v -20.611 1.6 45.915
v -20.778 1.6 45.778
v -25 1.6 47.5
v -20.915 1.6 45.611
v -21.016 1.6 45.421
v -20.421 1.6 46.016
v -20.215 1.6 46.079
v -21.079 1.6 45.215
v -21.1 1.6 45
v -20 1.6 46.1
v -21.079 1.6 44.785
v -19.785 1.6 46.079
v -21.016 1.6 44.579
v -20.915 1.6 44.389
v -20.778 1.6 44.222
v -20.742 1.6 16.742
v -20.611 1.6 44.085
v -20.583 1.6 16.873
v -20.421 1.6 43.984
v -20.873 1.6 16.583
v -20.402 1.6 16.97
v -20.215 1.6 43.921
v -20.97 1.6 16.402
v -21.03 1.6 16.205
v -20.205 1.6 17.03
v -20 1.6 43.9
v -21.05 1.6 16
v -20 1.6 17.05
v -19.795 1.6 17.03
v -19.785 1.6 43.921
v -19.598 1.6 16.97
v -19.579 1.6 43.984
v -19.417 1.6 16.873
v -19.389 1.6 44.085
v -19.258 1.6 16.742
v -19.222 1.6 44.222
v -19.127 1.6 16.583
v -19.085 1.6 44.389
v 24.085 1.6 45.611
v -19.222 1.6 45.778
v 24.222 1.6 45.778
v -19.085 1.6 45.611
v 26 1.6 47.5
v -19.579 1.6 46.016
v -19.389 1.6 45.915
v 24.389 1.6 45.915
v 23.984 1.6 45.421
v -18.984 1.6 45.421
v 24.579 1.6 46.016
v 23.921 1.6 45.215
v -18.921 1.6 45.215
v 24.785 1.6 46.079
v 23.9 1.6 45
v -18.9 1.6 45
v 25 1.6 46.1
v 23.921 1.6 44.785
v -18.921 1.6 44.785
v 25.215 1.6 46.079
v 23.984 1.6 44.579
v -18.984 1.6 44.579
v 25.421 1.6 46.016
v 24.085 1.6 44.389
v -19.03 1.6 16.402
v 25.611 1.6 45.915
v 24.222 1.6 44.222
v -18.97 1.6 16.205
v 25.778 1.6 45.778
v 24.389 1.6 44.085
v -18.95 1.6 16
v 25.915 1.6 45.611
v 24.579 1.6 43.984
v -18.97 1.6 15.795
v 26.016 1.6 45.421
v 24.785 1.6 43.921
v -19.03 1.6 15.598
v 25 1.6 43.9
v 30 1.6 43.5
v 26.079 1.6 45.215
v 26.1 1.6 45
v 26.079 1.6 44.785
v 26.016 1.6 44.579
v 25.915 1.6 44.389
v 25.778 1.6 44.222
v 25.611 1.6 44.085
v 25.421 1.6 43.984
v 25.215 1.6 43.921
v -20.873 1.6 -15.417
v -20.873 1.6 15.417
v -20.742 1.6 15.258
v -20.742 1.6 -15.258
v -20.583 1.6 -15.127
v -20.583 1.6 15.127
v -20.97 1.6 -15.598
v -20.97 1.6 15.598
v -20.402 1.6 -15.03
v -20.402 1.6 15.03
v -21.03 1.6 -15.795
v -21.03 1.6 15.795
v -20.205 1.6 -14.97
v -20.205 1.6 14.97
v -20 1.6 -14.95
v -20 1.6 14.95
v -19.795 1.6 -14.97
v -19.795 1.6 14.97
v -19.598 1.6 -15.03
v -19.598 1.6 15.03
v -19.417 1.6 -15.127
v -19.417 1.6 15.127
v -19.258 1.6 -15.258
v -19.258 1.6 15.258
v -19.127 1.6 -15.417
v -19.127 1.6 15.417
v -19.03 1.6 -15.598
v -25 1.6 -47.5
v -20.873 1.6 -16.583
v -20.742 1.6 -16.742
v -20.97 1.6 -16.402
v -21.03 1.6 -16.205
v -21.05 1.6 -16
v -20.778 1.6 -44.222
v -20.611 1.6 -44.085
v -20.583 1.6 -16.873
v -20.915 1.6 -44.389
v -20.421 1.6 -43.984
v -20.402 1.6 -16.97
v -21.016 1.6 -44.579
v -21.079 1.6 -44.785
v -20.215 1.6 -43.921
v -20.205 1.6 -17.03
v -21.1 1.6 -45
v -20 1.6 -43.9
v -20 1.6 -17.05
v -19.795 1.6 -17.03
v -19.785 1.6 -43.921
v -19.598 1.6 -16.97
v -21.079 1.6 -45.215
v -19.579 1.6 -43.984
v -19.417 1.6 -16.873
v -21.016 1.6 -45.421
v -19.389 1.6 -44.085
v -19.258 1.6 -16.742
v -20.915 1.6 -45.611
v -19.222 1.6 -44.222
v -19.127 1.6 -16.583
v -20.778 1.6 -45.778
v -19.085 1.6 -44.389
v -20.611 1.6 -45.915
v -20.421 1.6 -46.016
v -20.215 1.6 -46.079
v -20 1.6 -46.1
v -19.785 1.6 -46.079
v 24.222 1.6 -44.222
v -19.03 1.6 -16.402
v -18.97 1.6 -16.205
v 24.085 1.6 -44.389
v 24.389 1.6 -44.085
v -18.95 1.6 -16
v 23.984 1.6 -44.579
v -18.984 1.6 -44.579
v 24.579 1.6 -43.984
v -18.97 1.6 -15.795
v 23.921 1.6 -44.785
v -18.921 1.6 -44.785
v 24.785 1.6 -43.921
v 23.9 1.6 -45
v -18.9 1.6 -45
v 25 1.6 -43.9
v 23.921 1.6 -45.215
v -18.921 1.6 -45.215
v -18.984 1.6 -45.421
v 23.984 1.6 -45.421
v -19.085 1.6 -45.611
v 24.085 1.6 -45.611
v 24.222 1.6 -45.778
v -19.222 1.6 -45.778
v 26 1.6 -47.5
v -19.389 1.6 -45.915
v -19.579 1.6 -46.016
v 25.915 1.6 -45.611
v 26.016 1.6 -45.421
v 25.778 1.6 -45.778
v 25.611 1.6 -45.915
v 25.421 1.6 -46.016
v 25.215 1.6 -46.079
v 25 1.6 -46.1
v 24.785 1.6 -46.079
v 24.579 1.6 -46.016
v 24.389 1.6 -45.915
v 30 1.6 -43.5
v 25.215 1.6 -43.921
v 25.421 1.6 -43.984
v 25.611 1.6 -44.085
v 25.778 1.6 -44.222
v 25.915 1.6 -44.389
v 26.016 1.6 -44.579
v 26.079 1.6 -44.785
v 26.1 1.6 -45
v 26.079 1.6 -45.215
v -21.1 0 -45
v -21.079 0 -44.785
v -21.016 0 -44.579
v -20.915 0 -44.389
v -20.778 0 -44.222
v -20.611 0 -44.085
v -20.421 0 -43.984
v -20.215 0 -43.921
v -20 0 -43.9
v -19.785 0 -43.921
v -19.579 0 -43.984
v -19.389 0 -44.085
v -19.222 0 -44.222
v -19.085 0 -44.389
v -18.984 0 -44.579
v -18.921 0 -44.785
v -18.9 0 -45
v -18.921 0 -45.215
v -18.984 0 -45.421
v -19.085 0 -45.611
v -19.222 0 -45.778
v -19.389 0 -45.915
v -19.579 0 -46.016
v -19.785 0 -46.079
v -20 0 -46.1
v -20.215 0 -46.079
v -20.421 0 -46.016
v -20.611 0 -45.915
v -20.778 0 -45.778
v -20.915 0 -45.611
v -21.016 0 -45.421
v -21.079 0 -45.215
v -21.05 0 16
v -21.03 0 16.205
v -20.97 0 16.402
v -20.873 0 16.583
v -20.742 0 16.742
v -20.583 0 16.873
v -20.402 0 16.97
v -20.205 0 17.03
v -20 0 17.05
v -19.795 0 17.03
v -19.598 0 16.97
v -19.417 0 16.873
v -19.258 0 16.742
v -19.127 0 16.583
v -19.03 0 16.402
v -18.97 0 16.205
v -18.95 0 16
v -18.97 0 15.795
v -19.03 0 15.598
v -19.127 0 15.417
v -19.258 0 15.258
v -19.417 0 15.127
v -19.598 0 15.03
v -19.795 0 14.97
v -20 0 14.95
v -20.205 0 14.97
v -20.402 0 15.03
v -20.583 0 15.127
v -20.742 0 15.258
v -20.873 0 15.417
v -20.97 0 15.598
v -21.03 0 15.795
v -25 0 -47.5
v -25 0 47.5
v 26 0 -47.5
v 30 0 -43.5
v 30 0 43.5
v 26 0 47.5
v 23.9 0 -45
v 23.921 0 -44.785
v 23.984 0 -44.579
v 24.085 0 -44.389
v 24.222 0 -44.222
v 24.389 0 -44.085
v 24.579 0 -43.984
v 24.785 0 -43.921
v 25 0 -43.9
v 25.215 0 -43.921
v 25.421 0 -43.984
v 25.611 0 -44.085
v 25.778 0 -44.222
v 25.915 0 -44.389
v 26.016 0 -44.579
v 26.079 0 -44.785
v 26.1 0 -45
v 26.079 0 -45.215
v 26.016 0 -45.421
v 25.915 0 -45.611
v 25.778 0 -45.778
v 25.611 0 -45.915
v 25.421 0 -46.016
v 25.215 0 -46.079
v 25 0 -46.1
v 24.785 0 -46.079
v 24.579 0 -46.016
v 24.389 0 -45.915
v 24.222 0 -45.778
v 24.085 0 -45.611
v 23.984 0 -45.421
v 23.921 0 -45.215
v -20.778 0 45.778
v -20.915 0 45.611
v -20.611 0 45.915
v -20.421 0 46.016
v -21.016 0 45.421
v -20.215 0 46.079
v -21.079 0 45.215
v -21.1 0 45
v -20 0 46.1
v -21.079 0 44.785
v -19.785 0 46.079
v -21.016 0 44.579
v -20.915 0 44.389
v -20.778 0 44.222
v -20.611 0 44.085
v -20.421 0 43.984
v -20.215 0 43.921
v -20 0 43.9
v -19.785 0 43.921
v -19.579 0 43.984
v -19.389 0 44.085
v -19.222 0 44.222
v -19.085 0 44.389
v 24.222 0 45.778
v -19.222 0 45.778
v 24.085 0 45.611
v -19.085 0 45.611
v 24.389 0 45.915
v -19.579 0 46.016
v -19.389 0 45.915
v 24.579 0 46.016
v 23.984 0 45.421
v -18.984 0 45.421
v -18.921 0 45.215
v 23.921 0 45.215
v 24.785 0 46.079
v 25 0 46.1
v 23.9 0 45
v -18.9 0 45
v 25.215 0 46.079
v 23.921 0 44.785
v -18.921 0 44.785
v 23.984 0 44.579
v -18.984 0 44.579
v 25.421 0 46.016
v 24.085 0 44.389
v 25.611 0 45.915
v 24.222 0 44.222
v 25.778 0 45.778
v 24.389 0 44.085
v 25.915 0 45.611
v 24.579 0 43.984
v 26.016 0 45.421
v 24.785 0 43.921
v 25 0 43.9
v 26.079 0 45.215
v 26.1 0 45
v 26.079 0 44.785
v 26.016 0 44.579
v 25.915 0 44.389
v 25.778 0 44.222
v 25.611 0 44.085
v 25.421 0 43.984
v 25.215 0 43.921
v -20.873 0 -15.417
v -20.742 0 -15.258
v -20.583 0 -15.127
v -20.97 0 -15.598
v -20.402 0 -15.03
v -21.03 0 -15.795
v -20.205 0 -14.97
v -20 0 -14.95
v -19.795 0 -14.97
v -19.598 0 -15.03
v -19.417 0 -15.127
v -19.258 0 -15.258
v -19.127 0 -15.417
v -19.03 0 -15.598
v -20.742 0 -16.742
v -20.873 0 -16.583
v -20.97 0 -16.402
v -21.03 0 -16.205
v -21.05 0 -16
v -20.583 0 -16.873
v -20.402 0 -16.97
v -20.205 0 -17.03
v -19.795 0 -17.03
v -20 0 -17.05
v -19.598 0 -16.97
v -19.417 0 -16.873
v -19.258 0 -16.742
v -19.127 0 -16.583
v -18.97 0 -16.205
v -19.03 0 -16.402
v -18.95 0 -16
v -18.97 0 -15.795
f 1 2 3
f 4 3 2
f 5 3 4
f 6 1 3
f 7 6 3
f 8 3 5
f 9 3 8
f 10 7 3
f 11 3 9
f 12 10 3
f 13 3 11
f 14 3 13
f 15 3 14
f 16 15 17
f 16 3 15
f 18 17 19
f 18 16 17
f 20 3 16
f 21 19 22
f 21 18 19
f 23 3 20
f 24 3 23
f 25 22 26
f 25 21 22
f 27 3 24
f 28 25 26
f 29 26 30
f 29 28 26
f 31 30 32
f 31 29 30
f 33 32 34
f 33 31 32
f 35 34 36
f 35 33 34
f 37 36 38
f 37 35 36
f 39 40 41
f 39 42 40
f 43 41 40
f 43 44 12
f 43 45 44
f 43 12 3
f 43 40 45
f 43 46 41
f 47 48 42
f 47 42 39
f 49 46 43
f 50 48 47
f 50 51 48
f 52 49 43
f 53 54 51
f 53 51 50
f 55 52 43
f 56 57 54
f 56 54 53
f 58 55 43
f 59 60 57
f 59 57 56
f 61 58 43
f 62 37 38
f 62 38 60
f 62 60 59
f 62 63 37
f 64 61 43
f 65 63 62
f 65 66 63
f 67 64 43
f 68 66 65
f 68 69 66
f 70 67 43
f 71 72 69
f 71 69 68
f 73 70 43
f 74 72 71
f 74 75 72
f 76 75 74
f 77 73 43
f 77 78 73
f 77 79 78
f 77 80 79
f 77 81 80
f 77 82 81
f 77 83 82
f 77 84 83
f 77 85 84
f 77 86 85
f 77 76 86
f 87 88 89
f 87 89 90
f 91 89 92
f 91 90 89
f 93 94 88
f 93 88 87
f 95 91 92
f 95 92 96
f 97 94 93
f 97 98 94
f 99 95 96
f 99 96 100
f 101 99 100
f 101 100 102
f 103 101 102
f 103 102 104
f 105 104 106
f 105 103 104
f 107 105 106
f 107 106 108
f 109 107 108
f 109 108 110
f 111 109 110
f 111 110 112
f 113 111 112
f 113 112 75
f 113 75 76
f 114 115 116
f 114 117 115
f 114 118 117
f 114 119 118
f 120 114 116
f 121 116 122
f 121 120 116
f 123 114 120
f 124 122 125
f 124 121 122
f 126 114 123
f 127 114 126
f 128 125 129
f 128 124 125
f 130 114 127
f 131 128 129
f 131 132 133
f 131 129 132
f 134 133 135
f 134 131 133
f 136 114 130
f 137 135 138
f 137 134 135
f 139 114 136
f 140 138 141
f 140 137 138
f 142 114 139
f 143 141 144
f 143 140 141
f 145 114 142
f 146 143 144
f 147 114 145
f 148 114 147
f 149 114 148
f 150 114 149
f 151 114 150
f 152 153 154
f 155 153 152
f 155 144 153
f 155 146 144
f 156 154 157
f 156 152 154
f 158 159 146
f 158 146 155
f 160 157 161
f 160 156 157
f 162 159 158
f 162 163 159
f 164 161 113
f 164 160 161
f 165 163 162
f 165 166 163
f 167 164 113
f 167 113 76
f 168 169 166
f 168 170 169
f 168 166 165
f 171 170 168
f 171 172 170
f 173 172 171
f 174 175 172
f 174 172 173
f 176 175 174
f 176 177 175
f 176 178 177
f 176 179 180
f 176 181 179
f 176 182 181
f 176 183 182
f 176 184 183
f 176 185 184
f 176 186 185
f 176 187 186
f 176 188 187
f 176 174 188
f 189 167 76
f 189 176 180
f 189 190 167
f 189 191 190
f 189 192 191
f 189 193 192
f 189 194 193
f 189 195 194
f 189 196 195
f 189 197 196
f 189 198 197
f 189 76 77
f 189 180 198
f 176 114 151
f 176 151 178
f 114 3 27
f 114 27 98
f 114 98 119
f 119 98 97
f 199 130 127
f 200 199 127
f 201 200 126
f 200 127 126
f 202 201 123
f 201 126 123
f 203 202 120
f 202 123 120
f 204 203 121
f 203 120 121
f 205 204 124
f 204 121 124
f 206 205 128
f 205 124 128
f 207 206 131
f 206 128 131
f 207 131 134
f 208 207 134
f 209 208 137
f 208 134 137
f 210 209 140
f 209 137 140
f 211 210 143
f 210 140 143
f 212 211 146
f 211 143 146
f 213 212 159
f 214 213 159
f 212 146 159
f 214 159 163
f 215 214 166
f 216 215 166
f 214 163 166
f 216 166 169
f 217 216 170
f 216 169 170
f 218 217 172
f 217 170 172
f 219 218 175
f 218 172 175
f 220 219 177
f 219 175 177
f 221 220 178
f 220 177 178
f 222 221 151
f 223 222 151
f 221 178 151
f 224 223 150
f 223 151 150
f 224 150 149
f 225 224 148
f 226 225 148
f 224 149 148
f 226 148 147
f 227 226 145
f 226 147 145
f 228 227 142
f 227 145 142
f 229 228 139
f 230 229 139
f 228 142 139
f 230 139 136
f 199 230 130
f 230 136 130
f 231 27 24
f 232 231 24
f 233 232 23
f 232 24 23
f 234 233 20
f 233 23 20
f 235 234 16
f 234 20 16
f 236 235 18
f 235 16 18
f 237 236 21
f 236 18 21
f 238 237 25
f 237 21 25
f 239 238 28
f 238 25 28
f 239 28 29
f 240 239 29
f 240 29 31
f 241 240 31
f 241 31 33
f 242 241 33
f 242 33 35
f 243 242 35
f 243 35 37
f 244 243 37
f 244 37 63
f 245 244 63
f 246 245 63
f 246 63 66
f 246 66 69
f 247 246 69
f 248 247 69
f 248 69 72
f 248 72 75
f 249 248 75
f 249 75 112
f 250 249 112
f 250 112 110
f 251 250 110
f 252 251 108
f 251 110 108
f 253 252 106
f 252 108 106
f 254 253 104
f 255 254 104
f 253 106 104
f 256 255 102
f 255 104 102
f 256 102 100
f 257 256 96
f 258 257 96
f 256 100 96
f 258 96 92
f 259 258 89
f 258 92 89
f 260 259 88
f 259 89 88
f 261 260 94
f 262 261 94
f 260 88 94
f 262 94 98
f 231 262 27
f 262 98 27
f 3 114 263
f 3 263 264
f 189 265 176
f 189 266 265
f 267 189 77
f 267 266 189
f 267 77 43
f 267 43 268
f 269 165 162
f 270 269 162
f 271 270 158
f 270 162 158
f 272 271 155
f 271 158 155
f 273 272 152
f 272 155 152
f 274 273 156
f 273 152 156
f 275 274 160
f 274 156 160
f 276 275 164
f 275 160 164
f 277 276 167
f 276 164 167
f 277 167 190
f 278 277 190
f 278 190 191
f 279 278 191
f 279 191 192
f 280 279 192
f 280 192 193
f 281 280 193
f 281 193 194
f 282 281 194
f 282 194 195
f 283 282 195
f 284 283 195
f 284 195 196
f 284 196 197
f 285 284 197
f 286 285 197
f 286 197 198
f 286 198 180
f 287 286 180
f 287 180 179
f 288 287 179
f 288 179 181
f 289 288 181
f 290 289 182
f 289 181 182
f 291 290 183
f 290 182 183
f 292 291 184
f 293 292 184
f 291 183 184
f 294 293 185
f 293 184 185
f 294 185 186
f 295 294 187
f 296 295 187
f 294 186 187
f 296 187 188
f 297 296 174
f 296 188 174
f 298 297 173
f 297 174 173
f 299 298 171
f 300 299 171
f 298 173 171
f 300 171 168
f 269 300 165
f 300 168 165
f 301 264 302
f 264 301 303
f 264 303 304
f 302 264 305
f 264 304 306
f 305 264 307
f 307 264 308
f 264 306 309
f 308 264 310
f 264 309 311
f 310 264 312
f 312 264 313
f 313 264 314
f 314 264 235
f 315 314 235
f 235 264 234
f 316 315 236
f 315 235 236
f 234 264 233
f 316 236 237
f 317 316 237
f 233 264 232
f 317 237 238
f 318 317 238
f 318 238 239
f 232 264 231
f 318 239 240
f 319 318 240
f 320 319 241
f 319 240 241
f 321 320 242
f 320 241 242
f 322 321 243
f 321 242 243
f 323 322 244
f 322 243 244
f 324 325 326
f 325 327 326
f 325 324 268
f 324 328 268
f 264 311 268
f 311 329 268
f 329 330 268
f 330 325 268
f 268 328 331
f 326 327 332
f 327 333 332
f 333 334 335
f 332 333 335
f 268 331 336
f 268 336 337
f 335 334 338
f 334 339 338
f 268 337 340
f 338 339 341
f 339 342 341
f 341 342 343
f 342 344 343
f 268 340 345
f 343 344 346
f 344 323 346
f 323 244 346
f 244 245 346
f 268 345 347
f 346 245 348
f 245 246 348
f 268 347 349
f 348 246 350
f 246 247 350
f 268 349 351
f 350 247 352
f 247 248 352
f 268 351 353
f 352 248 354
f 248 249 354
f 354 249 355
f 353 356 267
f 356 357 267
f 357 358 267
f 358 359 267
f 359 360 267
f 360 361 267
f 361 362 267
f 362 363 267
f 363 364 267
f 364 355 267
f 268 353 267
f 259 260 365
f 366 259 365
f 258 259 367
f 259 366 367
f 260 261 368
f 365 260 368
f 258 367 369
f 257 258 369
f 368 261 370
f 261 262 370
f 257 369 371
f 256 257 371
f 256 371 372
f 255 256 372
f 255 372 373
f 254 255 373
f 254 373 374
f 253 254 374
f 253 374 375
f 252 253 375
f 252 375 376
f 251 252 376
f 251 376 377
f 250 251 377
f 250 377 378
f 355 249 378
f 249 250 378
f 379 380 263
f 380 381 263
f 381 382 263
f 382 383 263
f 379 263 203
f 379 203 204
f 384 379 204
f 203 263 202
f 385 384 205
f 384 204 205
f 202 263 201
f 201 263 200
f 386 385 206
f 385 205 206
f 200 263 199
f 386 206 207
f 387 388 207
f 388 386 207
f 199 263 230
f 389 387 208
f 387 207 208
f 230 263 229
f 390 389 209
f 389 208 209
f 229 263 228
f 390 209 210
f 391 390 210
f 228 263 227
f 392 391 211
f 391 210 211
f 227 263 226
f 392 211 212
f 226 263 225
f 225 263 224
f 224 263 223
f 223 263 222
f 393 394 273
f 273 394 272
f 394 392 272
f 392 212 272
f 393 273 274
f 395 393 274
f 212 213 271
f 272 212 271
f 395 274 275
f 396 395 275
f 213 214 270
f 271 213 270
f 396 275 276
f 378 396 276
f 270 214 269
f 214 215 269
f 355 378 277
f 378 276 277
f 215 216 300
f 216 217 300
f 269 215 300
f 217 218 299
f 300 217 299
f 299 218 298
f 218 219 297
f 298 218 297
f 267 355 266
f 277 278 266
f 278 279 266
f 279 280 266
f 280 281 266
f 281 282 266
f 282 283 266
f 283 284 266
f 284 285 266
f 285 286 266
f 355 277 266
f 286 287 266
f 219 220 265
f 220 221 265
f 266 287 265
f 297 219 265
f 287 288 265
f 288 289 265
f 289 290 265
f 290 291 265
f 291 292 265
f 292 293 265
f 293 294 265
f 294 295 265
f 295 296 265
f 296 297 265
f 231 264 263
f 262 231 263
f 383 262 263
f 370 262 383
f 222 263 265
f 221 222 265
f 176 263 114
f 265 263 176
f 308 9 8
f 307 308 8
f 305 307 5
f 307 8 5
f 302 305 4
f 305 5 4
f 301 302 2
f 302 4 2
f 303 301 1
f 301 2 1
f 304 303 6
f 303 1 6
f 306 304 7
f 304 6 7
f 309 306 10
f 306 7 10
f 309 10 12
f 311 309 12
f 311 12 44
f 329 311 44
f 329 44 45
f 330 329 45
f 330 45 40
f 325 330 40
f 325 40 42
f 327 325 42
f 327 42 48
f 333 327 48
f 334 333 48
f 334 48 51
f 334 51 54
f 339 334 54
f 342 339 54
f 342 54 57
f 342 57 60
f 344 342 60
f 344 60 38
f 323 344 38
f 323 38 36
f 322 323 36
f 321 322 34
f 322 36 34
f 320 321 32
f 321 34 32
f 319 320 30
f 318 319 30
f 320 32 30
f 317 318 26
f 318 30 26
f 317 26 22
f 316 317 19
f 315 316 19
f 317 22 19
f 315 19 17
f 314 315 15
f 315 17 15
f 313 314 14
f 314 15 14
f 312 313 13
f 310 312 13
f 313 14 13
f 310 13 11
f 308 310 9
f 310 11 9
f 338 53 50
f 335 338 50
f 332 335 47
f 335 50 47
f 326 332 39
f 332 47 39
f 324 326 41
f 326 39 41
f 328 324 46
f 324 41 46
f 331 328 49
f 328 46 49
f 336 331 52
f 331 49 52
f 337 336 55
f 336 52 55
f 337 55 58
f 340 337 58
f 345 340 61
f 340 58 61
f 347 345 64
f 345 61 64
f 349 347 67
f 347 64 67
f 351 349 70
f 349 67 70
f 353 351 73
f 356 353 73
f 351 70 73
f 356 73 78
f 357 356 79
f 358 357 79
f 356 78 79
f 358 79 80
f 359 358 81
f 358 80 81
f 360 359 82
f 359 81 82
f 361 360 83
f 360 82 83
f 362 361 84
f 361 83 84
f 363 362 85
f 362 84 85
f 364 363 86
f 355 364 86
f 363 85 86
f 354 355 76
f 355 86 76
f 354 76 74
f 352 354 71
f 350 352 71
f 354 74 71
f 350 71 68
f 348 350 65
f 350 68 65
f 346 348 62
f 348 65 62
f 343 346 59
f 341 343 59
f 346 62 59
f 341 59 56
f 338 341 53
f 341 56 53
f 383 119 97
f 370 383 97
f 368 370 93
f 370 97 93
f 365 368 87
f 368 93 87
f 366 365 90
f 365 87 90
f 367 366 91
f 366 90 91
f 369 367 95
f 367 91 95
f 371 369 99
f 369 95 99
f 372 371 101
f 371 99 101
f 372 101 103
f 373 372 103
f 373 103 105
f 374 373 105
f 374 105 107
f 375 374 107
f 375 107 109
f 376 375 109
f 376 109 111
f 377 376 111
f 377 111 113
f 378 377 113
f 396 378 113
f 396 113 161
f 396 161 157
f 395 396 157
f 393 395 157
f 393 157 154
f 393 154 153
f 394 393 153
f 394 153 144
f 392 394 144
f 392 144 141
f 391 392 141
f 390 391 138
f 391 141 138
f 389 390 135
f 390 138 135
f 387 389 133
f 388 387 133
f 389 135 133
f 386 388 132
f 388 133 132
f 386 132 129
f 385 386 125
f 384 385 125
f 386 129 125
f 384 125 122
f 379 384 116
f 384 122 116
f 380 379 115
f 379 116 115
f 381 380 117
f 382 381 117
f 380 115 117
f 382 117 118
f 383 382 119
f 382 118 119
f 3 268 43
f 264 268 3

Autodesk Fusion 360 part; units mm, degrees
sketch "Sketch1" plane through (0, 0, 0) normal (0, 1, 0) x (1, 0, 0)
  line L0 (30, -47.5) -> (-30, -47.5)
  line L1 (-30, -47.5) -> (-30, 47.5)
  line L2 (-30, 47.5) -> (30, 47.5)
  line L3 (30, 47.5) -> (30, -47.5)
  line L4 (30, -47.5) -> (-30, 47.5) construction
  line L5 (-30, -47.5) -> (30, 47.5) construction
  dimension "d1" = 60
  dimension "d2" = 95
extrude "Extrude1" add sketch "Sketch1" along normal blind 1.6
chamfer "Chamfer1" distance 4 angle 45 2 edges at (30, 0.8, 47.5) (30, 0.8, -47.5)
sketch "Sketch2" plane through (0, 1.6, 0) normal (0, 1, 0) x (-1, 0, 0)
  line L0 (-30, -43.5) -> (-26, -47.5)
  line L1 (-26, -47.5) -> (30, -47.5)
  line L2 (30, -47.5) -> (30, 47.5)
  line L3 (30, 47.5) -> (-26, 47.5)
  line L4 (-26, 47.5) -> (-30, 43.5)
  line L5 (-30, 43.5) -> (-30, -43.5)
  line L6 (30, 0) -> (-12.828, 0) construction
  line L7 (30, -47.5) -> (25, -47.5)
  line L8 (25, -47.5) -> (25, 47.5)
  line L9 (25, 47.5) -> (30, 47.5)
  line L10 (30, 47.5) -> (30, -47.5)
  dimension "d24" = 5
extrude "Extrude2" cut sketch "Sketch2" against normal through all contours L1 L2 L3 L7 L8 L9 L10
sketch "Sketch3" plane through (0, 1.6, 0) normal (0, 1, 0) x (-1, 0, 0)
  line L0 (25, 47.5) -> (-26, 47.5)
  line L1 (-26, 47.5) -> (-30, 43.5)
  line L2 (-30, 43.5) -> (-30, -43.5)
  line L3 (-30, -43.5) -> (-26, -47.5)
  line L4 (-26, -47.5) -> (25, -47.5)
  circle A0 centre (20, -45) radius 1.1
  line L5 (25, -47.5) -> (25, 47.5)
  dimension "d11" = 20
  dimension "d12" = 45
  dimension "d13" = 2.2
extrude "Extrude3" cut sketch "Sketch3" against normal through all contours A0
pattern_linear "R-Pattern1" count 2 spacing 45 along (1, 0, 0) count 2 spacing 90 along (0, 0, 1) of "Extrude3"
sketch "Sketch4" plane through (0, 1.6, 0) normal (0, 1, 0) x (-1, 0, 0)
  circle A0 centre (20, 45) radius 1.1
  circle A1 centre (20, -45) radius 1.1
  line L0 (25, 47.5) -> (-26, 47.5)
  line L1 (-26, 47.5) -> (-30, 43.5)
  line L2 (-30, 43.5) -> (-30, -43.5)
  line L3 (-30, -43.5) -> (-26, -47.5)
  line L4 (-26, -47.5) -> (25, -47.5)
  line L5 (20, -24) -> (20, 17) construction
  line L6 (0, 0) -> (36, 0) construction
  circle A2 centre (20, -16) radius 1.05
  circle A3 centre (20, 16) radius 1.05
  circle A4 centre (-25, 45) radius 1.1
  circle A5 centre (-25, -45) radius 1.1
  line L7 (25, -47.5) -> (25, 47.5)
  dimension "d19" = 32
  dimension "d20" = 16
  dimension "d21" = 20
  dimension "d22" = 2.1
extrude "Extrude4" cut sketch "Sketch4" against normal through all contours A2 | A3
